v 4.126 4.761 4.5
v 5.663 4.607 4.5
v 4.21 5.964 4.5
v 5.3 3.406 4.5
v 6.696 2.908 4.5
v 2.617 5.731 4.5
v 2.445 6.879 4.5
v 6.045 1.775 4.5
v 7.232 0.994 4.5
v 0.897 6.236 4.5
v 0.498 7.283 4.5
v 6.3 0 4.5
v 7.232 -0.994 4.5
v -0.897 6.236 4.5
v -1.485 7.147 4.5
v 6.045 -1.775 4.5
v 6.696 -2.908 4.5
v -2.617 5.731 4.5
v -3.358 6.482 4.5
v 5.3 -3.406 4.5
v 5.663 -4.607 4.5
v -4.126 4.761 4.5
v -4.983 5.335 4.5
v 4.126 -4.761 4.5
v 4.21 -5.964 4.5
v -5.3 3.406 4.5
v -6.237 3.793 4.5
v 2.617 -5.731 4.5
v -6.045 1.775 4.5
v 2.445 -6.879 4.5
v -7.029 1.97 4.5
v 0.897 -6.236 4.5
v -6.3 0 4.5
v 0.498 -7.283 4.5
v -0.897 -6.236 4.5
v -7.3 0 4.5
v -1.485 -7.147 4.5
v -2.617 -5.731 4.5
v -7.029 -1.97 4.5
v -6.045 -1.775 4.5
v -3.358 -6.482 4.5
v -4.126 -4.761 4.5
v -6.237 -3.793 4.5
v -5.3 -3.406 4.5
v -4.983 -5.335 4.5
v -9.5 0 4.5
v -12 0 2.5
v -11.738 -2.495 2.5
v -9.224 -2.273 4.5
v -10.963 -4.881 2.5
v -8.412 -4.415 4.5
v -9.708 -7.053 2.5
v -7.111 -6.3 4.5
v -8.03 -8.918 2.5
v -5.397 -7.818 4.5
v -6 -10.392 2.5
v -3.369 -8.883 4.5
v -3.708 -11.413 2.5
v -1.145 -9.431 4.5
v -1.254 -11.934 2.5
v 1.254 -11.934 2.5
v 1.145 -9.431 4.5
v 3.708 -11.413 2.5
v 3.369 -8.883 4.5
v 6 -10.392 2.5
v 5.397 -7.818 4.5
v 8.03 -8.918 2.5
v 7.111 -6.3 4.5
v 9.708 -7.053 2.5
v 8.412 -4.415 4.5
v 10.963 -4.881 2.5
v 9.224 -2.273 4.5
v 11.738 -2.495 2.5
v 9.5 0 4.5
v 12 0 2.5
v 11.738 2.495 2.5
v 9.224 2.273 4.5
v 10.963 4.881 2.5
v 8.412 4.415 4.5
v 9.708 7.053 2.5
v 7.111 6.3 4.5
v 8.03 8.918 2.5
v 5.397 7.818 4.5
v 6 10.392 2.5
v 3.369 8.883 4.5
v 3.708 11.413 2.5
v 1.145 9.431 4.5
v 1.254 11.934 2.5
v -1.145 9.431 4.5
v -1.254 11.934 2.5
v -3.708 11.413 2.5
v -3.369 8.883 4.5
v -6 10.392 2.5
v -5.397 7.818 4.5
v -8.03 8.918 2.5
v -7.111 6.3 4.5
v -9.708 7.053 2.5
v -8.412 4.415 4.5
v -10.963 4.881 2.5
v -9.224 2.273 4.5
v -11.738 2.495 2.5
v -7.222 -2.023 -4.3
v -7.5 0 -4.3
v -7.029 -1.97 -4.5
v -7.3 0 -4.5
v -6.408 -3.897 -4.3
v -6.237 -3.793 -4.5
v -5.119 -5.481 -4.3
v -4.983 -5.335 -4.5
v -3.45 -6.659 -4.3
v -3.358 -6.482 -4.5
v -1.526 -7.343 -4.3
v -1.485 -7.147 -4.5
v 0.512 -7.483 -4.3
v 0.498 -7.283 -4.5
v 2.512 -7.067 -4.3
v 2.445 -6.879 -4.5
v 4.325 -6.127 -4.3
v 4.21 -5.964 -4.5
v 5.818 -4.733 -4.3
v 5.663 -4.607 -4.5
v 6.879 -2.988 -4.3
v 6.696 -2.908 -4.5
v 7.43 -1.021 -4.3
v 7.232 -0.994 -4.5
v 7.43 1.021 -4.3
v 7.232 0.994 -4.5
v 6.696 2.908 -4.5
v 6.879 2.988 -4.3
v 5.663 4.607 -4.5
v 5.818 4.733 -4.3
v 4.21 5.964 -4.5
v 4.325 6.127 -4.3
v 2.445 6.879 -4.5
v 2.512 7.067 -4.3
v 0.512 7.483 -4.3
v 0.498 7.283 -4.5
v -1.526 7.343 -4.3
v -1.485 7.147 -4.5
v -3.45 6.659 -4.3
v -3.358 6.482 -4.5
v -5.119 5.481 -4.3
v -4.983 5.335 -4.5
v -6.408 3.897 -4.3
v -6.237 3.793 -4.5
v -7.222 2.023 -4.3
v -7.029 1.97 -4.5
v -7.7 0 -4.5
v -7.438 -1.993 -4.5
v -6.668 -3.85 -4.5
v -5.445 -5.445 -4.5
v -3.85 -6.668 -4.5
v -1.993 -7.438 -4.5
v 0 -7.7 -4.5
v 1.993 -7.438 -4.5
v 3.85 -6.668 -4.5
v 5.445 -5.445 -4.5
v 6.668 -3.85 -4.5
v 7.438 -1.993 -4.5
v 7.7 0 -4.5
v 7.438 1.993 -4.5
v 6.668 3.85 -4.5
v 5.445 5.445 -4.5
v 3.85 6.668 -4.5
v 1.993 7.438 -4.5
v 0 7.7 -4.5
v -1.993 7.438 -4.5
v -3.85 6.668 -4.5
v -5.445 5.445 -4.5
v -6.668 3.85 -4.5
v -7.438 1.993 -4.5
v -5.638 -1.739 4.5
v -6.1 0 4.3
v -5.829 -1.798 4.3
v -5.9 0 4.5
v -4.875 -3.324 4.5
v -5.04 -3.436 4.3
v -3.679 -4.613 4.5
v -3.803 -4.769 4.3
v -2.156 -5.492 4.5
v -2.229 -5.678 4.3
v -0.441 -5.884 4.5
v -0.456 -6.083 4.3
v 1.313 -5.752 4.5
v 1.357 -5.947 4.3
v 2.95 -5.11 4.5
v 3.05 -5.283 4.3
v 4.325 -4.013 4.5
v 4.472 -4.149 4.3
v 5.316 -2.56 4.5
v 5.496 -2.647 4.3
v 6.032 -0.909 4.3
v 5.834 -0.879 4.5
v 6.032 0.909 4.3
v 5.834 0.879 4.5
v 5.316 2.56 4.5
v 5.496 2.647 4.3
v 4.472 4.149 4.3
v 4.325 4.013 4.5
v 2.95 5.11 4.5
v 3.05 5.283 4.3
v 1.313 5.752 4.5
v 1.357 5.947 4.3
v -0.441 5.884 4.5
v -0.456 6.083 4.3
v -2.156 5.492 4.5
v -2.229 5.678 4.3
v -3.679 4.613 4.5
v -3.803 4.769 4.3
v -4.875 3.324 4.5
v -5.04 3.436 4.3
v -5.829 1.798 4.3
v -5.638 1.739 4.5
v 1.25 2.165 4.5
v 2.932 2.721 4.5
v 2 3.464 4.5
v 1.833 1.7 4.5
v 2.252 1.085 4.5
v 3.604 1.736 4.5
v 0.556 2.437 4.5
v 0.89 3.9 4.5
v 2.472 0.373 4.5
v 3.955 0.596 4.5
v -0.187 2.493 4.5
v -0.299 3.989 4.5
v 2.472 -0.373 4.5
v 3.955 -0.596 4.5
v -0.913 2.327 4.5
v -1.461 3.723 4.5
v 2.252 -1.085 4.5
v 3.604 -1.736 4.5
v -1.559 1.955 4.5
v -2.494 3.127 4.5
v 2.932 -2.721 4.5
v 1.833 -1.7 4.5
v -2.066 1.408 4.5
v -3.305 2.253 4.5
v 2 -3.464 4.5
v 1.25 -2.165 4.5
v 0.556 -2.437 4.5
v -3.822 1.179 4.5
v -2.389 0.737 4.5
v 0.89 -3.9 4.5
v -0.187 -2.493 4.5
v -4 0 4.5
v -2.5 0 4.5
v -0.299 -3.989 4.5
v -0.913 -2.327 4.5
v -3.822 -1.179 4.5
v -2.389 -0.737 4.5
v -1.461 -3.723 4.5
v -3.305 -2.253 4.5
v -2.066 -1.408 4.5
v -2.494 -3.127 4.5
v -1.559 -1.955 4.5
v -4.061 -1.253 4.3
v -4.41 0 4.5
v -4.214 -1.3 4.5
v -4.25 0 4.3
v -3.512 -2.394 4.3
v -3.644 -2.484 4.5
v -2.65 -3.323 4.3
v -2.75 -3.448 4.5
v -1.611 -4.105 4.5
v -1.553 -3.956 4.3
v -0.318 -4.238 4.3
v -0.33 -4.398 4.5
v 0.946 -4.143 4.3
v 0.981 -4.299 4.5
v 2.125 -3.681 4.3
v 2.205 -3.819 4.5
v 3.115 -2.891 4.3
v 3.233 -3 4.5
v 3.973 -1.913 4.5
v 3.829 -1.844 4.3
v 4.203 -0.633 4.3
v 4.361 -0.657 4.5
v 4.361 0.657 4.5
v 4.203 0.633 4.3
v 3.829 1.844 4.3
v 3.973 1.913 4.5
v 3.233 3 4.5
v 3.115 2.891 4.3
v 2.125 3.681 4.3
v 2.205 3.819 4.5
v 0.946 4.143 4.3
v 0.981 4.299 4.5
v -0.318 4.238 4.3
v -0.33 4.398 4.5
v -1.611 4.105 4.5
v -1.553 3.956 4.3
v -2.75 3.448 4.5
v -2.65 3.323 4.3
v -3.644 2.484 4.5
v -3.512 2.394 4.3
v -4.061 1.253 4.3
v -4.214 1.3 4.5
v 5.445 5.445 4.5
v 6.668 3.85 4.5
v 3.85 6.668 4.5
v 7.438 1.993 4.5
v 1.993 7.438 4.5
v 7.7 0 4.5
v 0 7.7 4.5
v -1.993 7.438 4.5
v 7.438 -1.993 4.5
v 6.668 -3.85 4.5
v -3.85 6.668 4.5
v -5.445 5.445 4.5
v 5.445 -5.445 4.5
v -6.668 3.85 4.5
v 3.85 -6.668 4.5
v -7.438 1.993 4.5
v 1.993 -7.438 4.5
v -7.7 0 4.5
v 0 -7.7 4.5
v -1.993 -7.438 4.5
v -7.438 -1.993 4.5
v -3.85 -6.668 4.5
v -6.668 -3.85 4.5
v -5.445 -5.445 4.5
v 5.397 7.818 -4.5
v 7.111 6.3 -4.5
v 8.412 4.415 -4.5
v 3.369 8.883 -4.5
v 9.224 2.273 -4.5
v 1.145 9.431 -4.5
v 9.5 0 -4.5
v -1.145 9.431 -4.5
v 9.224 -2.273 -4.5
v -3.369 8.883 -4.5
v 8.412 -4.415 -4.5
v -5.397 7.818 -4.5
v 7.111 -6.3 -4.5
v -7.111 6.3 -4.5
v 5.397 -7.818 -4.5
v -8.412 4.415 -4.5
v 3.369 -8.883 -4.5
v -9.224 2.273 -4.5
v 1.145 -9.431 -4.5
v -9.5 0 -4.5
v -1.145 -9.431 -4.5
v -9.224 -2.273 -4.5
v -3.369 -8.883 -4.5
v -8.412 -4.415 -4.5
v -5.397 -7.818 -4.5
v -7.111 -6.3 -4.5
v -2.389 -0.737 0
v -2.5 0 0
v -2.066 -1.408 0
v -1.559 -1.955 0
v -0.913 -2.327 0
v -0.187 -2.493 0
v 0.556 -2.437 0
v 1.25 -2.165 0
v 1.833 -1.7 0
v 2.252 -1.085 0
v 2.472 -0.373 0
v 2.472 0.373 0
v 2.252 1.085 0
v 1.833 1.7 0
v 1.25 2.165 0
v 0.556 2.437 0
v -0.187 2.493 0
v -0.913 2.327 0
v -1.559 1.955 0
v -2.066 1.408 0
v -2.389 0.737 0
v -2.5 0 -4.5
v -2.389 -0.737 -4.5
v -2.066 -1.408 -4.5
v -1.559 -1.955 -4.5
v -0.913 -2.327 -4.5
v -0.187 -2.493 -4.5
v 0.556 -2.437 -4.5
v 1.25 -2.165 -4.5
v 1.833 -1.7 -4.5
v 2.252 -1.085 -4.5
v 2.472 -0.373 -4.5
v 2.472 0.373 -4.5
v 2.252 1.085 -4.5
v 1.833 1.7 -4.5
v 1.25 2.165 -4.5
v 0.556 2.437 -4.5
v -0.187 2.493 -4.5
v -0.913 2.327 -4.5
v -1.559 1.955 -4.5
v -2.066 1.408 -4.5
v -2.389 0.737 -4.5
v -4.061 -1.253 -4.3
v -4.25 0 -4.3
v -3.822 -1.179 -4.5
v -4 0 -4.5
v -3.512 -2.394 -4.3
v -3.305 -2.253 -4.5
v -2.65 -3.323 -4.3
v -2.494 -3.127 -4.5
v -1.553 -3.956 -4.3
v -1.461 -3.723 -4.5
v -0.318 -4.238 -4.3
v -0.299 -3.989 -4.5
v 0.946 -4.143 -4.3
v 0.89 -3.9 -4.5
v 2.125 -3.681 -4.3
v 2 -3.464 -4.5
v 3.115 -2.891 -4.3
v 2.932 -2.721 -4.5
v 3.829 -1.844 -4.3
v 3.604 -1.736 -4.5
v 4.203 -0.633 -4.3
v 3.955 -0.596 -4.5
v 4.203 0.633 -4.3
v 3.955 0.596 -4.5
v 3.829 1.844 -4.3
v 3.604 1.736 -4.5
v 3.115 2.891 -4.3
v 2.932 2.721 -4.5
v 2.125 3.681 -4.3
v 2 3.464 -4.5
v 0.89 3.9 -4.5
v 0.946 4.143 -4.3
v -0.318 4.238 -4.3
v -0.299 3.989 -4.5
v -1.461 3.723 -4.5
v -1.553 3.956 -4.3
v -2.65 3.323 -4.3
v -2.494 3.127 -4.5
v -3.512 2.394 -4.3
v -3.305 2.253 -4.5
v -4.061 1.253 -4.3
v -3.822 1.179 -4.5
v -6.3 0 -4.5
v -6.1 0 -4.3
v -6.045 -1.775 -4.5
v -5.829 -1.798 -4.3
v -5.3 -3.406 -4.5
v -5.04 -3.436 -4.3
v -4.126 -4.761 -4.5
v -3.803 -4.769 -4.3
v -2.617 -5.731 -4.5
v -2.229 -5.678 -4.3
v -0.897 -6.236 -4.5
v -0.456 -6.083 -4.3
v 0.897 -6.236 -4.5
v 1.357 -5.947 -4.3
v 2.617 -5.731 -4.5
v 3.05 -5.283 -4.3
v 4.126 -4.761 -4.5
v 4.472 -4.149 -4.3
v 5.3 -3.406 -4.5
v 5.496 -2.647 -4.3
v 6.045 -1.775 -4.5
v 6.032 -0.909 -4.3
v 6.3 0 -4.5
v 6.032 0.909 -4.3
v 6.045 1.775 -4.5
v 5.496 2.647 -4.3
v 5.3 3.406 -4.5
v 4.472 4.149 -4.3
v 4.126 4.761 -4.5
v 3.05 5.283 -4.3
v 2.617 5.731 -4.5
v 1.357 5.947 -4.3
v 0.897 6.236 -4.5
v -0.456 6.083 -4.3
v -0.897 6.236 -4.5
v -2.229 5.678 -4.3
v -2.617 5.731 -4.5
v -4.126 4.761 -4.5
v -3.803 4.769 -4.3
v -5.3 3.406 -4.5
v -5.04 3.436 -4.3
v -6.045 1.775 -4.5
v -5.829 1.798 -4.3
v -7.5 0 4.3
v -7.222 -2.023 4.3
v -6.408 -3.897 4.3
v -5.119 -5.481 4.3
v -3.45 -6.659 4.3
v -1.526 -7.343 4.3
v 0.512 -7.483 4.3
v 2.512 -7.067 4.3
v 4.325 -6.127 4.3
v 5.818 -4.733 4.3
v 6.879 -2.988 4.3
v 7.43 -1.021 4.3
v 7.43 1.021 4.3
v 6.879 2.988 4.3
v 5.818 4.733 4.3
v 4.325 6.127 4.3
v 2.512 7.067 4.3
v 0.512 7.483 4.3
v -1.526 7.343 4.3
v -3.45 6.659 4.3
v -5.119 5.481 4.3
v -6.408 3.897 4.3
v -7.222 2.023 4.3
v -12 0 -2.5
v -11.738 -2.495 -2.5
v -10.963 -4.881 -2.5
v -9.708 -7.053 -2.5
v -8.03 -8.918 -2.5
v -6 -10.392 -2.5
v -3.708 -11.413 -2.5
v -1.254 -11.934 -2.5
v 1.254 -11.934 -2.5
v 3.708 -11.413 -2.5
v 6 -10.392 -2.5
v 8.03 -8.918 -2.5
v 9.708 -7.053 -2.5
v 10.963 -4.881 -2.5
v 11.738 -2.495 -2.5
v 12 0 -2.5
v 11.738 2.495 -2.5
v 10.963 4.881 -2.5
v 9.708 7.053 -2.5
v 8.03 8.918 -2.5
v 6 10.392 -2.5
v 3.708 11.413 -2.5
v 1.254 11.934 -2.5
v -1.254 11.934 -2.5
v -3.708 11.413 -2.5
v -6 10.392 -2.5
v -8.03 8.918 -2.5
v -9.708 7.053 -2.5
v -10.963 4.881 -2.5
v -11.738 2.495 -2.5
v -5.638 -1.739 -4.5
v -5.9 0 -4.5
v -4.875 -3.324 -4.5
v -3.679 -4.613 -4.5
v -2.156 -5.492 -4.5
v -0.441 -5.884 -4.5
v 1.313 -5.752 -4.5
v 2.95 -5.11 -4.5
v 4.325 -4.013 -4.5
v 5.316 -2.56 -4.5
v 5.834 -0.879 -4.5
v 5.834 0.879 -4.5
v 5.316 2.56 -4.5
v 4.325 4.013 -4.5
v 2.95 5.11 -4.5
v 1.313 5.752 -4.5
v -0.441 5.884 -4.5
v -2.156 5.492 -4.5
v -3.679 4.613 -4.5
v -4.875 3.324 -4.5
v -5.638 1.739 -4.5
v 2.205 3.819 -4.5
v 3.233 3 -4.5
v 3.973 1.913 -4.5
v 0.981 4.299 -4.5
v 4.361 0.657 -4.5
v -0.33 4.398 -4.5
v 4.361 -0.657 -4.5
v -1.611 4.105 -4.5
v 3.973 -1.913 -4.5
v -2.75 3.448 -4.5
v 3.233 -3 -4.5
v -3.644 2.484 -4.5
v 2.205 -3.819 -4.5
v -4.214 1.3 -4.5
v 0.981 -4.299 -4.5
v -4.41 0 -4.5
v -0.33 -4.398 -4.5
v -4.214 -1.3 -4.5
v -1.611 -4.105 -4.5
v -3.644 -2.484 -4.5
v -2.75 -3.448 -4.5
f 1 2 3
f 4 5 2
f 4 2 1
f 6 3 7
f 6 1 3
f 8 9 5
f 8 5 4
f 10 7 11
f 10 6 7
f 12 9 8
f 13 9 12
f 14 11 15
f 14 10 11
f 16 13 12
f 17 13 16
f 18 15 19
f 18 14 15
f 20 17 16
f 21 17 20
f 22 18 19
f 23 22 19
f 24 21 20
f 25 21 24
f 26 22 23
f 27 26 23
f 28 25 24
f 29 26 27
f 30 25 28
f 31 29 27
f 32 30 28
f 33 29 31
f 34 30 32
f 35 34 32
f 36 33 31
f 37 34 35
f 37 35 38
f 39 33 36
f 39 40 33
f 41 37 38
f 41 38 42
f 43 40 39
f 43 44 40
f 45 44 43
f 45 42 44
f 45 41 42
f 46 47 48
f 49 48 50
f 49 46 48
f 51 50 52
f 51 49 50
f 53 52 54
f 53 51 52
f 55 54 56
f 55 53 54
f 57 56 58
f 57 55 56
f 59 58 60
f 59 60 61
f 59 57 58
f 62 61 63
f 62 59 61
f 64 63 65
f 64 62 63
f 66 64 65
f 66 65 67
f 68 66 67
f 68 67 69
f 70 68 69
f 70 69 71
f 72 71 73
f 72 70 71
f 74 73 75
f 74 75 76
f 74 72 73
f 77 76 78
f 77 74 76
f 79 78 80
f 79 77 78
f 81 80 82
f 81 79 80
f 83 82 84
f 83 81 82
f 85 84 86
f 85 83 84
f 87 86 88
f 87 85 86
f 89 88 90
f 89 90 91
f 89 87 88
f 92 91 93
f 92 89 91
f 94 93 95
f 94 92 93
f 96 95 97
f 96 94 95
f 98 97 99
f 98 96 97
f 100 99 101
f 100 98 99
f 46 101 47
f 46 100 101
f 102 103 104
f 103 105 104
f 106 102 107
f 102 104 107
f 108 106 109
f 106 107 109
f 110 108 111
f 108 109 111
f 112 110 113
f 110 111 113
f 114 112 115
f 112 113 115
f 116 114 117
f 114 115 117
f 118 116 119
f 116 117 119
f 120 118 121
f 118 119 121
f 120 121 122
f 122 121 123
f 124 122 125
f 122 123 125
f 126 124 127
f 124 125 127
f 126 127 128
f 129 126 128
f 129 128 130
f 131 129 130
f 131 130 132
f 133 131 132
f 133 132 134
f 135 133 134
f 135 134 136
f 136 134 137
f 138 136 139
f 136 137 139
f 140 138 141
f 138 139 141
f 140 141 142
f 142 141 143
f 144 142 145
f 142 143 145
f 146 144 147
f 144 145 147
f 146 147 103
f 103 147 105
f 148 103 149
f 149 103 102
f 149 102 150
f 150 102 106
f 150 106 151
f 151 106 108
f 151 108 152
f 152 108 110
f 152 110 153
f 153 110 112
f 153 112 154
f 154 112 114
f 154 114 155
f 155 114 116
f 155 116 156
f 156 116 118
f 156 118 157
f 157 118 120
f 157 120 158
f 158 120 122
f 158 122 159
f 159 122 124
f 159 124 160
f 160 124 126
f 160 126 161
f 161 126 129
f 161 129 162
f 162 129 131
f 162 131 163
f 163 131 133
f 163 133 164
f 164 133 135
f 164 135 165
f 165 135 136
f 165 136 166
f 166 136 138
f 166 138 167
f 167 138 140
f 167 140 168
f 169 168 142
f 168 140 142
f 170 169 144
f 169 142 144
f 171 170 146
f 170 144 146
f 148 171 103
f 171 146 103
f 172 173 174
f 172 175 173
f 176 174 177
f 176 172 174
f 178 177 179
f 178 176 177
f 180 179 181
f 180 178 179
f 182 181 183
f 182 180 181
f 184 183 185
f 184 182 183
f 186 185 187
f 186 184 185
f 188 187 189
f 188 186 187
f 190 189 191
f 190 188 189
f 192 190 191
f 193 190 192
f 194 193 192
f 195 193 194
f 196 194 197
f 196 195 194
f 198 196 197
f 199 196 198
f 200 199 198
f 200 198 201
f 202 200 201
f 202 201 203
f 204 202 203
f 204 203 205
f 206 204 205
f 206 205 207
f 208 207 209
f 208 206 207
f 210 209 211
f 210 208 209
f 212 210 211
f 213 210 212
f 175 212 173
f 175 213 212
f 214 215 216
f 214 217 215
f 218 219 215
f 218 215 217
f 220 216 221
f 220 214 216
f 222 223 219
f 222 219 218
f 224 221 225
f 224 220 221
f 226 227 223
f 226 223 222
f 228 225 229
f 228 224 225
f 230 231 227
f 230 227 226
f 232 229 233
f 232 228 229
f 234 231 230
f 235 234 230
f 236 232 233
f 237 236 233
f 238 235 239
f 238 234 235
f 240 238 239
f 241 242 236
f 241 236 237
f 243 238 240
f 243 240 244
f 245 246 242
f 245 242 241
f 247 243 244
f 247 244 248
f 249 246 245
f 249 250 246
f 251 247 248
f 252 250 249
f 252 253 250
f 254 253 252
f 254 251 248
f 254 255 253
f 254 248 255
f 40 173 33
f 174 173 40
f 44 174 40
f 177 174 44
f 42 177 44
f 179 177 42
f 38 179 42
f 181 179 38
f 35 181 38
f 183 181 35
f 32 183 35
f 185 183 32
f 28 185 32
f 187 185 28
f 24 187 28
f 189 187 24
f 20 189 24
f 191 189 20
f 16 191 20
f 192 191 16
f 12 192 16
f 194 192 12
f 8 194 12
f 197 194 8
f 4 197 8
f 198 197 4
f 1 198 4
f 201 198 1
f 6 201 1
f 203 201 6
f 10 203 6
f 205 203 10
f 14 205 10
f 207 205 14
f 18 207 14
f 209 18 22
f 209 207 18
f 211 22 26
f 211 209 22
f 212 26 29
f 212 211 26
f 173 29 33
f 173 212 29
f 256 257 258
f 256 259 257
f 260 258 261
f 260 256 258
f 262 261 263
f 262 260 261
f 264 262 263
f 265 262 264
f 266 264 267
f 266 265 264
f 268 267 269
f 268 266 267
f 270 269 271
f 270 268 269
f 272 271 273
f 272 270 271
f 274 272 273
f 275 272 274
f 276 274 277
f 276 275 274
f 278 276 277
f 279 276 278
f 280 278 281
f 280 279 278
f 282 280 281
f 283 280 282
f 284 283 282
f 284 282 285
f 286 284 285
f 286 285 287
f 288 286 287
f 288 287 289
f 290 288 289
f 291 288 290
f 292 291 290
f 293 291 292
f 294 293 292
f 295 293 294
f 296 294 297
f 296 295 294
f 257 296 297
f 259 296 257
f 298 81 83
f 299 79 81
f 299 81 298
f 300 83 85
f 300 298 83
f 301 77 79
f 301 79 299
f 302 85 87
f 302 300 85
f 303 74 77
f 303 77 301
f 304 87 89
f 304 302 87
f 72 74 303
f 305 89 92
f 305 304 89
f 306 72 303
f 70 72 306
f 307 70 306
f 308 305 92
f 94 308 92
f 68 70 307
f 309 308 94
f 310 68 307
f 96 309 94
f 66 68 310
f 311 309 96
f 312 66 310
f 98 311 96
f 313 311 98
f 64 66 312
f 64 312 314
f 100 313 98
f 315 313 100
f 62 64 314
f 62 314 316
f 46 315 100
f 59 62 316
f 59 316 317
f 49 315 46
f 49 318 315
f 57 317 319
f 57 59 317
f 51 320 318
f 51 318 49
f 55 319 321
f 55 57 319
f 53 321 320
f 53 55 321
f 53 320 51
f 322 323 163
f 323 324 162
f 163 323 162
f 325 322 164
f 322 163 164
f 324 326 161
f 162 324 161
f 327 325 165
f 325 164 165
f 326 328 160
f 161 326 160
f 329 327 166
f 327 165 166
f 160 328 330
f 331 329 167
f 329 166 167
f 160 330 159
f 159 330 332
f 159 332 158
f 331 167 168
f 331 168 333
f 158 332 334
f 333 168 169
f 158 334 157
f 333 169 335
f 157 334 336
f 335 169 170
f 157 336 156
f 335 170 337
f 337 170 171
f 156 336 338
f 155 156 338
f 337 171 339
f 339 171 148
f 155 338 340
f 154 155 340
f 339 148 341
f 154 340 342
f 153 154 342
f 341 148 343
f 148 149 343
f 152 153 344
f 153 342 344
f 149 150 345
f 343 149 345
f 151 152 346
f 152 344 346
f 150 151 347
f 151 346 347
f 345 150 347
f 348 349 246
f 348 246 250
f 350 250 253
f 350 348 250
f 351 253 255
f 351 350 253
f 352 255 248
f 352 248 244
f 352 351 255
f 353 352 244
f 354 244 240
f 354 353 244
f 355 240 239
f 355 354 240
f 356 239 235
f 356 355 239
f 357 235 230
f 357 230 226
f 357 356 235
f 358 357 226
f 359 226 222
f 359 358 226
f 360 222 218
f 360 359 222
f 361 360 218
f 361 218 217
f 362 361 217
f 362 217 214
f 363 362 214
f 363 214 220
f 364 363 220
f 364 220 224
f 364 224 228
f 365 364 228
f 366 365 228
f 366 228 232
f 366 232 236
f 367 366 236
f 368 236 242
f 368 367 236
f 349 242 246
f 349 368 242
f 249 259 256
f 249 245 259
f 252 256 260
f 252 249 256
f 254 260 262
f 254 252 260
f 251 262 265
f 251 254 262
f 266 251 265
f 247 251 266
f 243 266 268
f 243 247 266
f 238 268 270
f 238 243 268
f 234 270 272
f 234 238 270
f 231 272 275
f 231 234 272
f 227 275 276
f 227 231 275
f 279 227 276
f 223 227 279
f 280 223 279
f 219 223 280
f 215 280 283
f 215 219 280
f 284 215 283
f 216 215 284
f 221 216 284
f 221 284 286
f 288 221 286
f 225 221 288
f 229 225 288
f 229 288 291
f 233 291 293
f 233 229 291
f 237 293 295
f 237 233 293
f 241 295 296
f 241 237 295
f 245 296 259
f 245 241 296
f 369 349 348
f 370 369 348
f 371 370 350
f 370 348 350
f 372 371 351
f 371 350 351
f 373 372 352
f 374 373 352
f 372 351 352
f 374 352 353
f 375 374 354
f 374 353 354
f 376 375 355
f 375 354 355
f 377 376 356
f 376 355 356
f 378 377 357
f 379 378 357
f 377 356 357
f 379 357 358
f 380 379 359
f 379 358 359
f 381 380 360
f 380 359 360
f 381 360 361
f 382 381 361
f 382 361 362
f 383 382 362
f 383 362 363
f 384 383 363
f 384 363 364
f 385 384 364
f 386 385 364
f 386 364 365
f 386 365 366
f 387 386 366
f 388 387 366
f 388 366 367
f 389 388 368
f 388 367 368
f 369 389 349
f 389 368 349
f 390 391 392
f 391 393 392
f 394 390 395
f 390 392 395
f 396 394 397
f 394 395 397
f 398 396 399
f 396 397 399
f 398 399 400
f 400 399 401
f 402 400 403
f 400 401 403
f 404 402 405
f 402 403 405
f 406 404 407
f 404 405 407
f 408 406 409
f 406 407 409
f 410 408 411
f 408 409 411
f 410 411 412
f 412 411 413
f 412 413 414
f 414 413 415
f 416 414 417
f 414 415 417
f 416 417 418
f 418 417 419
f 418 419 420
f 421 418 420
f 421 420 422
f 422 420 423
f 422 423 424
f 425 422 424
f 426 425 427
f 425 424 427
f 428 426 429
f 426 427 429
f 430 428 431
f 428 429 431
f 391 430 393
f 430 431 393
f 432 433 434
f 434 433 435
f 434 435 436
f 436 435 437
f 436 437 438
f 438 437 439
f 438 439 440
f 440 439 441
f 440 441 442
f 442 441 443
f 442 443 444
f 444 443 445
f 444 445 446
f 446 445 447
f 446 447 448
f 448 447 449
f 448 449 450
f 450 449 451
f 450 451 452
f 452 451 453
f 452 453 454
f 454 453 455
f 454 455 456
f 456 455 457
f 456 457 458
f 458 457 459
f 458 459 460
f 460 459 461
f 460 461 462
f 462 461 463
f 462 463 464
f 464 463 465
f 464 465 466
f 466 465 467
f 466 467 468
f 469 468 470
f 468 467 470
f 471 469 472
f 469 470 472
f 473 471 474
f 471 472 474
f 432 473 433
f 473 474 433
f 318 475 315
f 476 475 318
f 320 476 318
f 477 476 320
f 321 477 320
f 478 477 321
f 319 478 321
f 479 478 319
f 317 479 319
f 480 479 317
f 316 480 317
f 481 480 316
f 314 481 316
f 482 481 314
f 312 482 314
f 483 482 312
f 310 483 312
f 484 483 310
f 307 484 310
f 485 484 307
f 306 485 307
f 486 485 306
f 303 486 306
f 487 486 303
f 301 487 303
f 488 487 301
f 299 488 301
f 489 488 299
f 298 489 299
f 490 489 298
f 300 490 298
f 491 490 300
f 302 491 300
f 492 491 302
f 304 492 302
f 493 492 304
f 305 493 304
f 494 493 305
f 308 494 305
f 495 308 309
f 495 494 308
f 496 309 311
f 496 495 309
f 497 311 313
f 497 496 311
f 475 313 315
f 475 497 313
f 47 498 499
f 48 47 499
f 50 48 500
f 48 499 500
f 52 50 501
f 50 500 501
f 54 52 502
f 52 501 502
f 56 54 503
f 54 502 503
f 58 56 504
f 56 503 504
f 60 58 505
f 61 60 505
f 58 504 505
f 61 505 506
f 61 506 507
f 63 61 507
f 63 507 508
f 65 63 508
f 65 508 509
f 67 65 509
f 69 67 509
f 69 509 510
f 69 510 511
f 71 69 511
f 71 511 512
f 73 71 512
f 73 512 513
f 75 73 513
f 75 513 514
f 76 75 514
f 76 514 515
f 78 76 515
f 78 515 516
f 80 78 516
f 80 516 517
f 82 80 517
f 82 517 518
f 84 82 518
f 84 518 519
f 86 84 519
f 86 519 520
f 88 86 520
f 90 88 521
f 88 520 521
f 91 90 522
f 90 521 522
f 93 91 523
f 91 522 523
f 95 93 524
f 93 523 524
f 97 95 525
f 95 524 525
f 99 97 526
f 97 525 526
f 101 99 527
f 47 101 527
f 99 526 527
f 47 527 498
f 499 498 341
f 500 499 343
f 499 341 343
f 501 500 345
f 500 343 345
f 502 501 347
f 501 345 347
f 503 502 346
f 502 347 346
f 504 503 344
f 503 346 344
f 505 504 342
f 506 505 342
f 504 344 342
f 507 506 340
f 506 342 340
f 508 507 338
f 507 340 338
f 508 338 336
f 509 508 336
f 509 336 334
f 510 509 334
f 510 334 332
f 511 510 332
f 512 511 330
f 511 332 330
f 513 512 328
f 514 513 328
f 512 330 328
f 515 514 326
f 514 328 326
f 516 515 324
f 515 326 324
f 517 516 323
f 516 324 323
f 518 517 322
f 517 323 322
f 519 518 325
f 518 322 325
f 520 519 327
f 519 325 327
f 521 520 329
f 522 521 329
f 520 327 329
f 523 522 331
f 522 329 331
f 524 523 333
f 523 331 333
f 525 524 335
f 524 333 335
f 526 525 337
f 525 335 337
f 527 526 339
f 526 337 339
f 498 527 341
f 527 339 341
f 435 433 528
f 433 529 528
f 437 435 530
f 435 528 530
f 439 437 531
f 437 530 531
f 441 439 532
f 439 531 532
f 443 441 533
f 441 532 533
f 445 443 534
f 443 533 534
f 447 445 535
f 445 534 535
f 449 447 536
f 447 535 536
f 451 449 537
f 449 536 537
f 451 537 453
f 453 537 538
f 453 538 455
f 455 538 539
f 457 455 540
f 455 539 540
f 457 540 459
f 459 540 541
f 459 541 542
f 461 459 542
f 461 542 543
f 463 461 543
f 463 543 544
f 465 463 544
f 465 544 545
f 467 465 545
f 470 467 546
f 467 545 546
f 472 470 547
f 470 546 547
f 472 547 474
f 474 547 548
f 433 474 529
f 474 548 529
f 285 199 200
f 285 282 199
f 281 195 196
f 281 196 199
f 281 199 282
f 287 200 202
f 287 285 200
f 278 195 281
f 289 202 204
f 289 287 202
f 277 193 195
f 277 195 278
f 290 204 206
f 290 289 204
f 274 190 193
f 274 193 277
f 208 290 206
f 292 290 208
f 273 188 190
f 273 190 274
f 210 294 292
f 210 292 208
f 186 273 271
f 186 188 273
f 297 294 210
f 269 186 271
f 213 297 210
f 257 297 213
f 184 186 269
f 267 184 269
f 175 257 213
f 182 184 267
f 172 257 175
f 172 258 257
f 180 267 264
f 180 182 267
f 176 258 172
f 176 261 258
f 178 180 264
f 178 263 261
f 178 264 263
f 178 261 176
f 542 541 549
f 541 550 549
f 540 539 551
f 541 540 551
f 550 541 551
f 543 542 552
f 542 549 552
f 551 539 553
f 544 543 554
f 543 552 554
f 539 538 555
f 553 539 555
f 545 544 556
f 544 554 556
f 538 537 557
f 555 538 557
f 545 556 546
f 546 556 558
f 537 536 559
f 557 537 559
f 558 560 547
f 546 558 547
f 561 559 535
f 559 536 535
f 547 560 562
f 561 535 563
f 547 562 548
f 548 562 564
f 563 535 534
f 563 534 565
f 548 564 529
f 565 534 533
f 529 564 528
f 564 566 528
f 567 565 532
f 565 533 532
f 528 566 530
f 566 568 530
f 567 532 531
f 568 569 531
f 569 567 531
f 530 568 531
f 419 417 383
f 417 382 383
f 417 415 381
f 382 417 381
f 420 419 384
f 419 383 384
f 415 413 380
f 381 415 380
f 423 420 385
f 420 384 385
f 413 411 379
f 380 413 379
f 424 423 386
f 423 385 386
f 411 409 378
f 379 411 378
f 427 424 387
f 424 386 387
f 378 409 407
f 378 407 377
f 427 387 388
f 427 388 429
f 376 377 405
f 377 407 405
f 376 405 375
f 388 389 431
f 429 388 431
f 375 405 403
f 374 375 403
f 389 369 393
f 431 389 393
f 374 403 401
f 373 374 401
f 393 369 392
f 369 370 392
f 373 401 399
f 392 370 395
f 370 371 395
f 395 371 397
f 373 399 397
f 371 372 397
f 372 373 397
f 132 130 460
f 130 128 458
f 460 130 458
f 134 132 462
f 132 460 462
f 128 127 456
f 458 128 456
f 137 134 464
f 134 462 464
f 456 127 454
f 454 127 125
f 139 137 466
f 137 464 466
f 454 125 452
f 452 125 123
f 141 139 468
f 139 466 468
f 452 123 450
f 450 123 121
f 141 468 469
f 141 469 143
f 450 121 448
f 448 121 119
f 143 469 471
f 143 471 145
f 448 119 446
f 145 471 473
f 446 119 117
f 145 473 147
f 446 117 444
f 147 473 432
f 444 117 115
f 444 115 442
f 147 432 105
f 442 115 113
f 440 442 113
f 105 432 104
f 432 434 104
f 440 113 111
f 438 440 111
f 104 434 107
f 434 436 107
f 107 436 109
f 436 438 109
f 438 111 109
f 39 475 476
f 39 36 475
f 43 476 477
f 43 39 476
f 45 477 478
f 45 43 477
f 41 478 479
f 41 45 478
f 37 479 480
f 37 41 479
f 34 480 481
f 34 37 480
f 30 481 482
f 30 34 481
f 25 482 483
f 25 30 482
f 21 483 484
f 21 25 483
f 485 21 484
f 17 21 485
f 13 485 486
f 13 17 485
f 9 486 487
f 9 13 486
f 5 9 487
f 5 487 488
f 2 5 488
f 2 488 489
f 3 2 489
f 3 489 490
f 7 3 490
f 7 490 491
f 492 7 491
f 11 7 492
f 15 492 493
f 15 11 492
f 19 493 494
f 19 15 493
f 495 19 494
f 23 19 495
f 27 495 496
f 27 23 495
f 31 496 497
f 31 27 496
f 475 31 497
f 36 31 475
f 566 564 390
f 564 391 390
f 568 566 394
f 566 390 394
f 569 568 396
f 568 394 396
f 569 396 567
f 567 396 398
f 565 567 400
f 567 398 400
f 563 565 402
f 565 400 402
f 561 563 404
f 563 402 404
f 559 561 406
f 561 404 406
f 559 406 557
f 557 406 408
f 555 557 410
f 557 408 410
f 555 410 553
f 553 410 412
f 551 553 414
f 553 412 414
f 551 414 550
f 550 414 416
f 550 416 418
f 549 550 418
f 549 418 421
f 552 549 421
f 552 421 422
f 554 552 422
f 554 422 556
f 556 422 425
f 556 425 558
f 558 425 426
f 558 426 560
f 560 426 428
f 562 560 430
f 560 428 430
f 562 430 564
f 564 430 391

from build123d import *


with BuildPart() as part:
    # Sketch1 → Revolve1 (revolve)
    with BuildSketch(Plane(origin=(0, 0, 0), x_dir=(0, 0, -1), z_dir=(1, 0, 0)), mode=Mode.PRIVATE) as revolve1_sk:
        Polygon((-4.5, 7.3), (-4.5, 6.3), (-4.3, 6.1), (-4.5, 5.9), (-4.5, 4.41), (-4.3, 4.25), (-4.5, 4), (-4.5, 2.5), (0, 2.5), (0, 12), (-2.5, 12), (-4.5, 9.5), (-4.5, 7.7), (-4.3, 7.5), align=None)
    revolve(revolve1_sk.sketch.rotate(Axis((0, 0, 0), (0, 0, 1)), 90), axis=Axis((0, 0, 0), (0, 0, 1)))

    # Mirror1: part across plane


with BuildPart() as part_1:
    add(part.part)
    add(part.part.mirror(Plane(origin=(0, 2.5, 0), x_dir=(1, 0, 0), z_dir=(0, 0, -1))))


solid = part_1.part
